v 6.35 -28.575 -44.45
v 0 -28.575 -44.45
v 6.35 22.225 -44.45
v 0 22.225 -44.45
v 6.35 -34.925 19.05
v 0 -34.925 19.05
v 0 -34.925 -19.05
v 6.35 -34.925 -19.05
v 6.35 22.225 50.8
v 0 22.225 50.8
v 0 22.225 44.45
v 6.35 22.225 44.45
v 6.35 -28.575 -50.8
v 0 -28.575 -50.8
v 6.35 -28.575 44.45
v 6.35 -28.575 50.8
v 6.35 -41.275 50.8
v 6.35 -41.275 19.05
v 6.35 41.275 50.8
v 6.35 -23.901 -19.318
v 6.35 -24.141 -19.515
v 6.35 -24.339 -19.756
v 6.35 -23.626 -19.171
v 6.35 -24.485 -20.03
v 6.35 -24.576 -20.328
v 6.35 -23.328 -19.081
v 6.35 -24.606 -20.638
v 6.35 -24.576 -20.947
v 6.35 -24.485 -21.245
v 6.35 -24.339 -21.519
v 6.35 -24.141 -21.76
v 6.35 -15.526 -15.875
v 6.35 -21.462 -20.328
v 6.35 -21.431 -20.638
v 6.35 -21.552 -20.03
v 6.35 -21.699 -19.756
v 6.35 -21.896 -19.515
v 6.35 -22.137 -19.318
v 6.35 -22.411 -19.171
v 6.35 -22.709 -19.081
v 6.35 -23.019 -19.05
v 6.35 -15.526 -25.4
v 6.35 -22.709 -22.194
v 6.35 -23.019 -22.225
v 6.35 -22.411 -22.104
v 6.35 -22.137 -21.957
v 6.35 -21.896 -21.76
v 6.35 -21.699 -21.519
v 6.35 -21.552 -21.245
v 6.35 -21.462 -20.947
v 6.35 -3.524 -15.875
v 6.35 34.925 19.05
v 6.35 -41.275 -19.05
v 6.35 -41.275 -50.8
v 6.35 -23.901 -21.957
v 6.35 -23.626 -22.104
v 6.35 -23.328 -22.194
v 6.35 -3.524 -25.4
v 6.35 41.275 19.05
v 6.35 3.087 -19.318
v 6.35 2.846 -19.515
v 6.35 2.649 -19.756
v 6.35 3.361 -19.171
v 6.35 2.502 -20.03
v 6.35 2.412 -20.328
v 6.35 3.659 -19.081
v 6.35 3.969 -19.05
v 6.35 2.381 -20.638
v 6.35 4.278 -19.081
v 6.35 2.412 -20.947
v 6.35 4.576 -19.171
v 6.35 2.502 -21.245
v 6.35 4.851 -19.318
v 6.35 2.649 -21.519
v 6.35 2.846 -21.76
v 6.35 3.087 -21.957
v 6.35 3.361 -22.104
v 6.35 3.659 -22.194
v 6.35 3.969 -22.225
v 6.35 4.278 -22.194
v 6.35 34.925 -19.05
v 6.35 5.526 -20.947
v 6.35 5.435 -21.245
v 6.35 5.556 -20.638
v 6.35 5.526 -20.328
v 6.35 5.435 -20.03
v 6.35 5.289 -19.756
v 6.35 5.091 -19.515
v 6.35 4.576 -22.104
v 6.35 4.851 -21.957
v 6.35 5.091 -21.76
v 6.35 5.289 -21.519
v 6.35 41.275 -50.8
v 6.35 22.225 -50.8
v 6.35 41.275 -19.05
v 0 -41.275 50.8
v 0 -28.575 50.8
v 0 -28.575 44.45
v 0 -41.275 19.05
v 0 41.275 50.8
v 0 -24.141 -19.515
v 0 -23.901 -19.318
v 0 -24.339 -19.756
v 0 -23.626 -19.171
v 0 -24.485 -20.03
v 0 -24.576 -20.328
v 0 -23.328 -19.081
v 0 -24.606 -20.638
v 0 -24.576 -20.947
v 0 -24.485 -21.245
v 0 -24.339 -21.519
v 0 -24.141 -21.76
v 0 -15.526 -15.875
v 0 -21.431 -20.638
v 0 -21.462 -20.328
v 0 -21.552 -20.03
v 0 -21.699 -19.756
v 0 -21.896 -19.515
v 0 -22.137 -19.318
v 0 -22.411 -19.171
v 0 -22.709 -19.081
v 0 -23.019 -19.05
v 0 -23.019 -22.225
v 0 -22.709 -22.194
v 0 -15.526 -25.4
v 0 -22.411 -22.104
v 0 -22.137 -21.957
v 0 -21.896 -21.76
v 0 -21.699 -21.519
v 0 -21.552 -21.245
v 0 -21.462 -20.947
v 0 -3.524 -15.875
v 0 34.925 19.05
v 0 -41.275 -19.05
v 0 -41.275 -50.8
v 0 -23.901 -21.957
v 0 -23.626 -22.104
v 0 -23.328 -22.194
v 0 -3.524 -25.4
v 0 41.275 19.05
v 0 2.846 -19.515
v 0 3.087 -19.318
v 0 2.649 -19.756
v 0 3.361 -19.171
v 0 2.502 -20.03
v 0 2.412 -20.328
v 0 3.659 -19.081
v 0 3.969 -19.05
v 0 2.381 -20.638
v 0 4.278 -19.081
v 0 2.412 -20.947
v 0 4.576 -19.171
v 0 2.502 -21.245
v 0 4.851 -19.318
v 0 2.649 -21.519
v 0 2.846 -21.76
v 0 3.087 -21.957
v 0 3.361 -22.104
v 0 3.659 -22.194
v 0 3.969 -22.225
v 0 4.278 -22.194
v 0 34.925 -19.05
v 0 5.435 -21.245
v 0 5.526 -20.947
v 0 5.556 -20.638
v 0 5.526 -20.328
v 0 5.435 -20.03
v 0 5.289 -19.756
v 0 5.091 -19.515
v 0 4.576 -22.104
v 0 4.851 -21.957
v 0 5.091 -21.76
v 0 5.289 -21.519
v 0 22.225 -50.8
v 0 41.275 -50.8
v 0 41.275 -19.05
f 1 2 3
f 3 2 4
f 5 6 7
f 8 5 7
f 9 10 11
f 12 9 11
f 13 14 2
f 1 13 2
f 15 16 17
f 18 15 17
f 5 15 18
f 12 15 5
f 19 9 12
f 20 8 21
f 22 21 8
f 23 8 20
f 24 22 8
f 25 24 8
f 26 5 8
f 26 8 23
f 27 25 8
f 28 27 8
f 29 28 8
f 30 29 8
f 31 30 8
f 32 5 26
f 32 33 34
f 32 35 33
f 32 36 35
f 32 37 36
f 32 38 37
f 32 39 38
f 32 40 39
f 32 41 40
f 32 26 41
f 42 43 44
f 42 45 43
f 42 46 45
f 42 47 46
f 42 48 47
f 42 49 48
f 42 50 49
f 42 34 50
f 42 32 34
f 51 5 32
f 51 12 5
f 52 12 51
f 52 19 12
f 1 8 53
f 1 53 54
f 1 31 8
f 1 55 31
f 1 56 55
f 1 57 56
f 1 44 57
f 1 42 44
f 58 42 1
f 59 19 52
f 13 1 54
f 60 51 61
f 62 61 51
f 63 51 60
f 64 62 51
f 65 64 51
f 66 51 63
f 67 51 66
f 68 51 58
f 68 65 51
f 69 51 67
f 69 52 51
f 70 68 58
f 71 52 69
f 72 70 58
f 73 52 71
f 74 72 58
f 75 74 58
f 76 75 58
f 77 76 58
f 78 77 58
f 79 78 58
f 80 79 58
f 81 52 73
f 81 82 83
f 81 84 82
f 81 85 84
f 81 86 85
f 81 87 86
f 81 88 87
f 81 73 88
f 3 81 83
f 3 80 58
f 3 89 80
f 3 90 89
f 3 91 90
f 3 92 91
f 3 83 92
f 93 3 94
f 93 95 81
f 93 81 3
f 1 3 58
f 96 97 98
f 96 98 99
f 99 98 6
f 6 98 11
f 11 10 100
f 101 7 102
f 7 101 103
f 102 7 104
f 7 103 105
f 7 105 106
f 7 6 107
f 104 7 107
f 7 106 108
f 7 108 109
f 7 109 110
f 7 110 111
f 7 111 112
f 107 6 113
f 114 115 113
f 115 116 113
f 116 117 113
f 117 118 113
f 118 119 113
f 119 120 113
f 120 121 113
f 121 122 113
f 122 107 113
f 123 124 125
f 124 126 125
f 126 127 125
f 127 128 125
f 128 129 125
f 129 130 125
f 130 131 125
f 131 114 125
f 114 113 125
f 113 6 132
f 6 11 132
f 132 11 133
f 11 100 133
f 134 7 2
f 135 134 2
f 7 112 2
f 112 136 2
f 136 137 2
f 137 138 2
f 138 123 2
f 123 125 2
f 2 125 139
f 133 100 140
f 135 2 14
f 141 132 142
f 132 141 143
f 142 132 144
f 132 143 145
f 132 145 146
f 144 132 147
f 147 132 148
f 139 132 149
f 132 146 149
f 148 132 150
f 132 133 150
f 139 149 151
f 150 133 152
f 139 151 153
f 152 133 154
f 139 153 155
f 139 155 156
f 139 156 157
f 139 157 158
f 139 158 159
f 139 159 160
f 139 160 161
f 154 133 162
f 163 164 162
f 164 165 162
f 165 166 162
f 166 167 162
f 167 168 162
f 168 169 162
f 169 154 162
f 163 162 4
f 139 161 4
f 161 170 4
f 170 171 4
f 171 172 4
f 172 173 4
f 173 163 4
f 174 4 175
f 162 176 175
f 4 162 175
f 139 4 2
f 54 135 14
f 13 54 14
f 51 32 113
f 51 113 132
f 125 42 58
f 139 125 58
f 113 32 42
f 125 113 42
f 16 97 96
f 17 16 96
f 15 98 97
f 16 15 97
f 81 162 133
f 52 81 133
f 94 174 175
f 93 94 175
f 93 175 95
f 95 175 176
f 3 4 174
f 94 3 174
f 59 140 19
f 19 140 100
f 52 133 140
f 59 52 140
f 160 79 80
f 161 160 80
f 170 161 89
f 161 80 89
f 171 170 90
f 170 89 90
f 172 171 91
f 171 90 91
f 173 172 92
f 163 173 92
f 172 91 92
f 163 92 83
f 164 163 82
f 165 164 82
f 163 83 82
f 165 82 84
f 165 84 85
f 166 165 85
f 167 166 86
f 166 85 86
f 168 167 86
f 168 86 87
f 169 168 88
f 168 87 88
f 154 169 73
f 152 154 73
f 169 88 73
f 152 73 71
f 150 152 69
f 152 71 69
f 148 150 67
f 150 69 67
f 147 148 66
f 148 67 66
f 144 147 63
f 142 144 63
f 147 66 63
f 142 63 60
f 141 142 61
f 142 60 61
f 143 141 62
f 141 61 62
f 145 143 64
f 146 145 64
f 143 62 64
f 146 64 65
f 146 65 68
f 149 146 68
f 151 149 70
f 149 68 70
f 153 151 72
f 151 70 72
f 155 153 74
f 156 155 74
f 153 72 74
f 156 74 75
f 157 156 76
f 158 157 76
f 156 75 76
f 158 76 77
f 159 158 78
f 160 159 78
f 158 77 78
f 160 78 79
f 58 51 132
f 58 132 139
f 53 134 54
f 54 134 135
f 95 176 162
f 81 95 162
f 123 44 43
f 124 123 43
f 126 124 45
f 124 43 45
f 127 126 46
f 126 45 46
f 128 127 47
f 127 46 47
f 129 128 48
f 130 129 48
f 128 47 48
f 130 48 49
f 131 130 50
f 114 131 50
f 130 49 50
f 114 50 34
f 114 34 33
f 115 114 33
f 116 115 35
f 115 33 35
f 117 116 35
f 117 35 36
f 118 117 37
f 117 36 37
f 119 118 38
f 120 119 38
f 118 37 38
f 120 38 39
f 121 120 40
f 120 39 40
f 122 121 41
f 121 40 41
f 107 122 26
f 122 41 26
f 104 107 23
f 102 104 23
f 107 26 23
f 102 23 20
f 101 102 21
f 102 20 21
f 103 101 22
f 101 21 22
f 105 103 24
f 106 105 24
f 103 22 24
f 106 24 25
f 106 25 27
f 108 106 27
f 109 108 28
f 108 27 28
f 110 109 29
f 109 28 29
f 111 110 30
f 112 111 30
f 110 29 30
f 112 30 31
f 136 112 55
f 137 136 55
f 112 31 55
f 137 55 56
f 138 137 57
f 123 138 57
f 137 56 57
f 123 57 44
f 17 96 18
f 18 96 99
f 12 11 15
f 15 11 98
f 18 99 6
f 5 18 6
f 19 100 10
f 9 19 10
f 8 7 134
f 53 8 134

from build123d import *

# Parameters (mm, degrees)
BOSS_EXTRUDE1_DEPTH = 6.35
SKETCH2_R           = 1.5875
SKETCH2_W           = 9.525
SKETCH2_H           = 12.0015
CUT_EXTRUDE1_DEPTH  = 6.35


with BuildPart() as part:
    # Sketch1 → Boss-Extrude1 (new body)
    with BuildSketch(Plane(origin=(0, 0, 0), x_dir=(0, 0, -1), z_dir=(1, 0, 0))):
        Polygon((-50.8, -28.575), (-50.8, -41.275), (-19.05, -41.275), (-19.05, -34.925), (19.05, -34.925), (19.05, -41.275), (50.8, -41.275), (50.8, -28.575), (44.45, -28.575), (44.45, 22.225), (50.8, 22.225), (50.8, 41.275), (19.05, 41.275), (19.05, 34.925), (-19.05, 34.925), (-19.05, 41.275), (-50.8, 41.275), (-50.8, 22.225), (-44.45, 22.225), (-44.45, -28.575), align=None)
    extrude(amount=BOSS_EXTRUDE1_DEPTH)

    # Sketch2 → Cut-Extrude1 (cut)
    with BuildSketch(Plane(origin=(6.35, 95.4107123, 69.821382876), x_dir=(0, 0, -1), z_dir=(1, 0, 0))):
        with Locations((90.458882876, -118.4294623)):
            Circle(SKETCH2_R)
        with Locations((90.458882876, -91.4419623)):
            Circle(SKETCH2_R)
        with Locations((90.458882876, -104.9357123)):
            Rectangle(SKETCH2_W, SKETCH2_H)
    extrude(amount=-CUT_EXTRUDE1_DEPTH, mode=Mode.SUBTRACT)


solid = part.part
